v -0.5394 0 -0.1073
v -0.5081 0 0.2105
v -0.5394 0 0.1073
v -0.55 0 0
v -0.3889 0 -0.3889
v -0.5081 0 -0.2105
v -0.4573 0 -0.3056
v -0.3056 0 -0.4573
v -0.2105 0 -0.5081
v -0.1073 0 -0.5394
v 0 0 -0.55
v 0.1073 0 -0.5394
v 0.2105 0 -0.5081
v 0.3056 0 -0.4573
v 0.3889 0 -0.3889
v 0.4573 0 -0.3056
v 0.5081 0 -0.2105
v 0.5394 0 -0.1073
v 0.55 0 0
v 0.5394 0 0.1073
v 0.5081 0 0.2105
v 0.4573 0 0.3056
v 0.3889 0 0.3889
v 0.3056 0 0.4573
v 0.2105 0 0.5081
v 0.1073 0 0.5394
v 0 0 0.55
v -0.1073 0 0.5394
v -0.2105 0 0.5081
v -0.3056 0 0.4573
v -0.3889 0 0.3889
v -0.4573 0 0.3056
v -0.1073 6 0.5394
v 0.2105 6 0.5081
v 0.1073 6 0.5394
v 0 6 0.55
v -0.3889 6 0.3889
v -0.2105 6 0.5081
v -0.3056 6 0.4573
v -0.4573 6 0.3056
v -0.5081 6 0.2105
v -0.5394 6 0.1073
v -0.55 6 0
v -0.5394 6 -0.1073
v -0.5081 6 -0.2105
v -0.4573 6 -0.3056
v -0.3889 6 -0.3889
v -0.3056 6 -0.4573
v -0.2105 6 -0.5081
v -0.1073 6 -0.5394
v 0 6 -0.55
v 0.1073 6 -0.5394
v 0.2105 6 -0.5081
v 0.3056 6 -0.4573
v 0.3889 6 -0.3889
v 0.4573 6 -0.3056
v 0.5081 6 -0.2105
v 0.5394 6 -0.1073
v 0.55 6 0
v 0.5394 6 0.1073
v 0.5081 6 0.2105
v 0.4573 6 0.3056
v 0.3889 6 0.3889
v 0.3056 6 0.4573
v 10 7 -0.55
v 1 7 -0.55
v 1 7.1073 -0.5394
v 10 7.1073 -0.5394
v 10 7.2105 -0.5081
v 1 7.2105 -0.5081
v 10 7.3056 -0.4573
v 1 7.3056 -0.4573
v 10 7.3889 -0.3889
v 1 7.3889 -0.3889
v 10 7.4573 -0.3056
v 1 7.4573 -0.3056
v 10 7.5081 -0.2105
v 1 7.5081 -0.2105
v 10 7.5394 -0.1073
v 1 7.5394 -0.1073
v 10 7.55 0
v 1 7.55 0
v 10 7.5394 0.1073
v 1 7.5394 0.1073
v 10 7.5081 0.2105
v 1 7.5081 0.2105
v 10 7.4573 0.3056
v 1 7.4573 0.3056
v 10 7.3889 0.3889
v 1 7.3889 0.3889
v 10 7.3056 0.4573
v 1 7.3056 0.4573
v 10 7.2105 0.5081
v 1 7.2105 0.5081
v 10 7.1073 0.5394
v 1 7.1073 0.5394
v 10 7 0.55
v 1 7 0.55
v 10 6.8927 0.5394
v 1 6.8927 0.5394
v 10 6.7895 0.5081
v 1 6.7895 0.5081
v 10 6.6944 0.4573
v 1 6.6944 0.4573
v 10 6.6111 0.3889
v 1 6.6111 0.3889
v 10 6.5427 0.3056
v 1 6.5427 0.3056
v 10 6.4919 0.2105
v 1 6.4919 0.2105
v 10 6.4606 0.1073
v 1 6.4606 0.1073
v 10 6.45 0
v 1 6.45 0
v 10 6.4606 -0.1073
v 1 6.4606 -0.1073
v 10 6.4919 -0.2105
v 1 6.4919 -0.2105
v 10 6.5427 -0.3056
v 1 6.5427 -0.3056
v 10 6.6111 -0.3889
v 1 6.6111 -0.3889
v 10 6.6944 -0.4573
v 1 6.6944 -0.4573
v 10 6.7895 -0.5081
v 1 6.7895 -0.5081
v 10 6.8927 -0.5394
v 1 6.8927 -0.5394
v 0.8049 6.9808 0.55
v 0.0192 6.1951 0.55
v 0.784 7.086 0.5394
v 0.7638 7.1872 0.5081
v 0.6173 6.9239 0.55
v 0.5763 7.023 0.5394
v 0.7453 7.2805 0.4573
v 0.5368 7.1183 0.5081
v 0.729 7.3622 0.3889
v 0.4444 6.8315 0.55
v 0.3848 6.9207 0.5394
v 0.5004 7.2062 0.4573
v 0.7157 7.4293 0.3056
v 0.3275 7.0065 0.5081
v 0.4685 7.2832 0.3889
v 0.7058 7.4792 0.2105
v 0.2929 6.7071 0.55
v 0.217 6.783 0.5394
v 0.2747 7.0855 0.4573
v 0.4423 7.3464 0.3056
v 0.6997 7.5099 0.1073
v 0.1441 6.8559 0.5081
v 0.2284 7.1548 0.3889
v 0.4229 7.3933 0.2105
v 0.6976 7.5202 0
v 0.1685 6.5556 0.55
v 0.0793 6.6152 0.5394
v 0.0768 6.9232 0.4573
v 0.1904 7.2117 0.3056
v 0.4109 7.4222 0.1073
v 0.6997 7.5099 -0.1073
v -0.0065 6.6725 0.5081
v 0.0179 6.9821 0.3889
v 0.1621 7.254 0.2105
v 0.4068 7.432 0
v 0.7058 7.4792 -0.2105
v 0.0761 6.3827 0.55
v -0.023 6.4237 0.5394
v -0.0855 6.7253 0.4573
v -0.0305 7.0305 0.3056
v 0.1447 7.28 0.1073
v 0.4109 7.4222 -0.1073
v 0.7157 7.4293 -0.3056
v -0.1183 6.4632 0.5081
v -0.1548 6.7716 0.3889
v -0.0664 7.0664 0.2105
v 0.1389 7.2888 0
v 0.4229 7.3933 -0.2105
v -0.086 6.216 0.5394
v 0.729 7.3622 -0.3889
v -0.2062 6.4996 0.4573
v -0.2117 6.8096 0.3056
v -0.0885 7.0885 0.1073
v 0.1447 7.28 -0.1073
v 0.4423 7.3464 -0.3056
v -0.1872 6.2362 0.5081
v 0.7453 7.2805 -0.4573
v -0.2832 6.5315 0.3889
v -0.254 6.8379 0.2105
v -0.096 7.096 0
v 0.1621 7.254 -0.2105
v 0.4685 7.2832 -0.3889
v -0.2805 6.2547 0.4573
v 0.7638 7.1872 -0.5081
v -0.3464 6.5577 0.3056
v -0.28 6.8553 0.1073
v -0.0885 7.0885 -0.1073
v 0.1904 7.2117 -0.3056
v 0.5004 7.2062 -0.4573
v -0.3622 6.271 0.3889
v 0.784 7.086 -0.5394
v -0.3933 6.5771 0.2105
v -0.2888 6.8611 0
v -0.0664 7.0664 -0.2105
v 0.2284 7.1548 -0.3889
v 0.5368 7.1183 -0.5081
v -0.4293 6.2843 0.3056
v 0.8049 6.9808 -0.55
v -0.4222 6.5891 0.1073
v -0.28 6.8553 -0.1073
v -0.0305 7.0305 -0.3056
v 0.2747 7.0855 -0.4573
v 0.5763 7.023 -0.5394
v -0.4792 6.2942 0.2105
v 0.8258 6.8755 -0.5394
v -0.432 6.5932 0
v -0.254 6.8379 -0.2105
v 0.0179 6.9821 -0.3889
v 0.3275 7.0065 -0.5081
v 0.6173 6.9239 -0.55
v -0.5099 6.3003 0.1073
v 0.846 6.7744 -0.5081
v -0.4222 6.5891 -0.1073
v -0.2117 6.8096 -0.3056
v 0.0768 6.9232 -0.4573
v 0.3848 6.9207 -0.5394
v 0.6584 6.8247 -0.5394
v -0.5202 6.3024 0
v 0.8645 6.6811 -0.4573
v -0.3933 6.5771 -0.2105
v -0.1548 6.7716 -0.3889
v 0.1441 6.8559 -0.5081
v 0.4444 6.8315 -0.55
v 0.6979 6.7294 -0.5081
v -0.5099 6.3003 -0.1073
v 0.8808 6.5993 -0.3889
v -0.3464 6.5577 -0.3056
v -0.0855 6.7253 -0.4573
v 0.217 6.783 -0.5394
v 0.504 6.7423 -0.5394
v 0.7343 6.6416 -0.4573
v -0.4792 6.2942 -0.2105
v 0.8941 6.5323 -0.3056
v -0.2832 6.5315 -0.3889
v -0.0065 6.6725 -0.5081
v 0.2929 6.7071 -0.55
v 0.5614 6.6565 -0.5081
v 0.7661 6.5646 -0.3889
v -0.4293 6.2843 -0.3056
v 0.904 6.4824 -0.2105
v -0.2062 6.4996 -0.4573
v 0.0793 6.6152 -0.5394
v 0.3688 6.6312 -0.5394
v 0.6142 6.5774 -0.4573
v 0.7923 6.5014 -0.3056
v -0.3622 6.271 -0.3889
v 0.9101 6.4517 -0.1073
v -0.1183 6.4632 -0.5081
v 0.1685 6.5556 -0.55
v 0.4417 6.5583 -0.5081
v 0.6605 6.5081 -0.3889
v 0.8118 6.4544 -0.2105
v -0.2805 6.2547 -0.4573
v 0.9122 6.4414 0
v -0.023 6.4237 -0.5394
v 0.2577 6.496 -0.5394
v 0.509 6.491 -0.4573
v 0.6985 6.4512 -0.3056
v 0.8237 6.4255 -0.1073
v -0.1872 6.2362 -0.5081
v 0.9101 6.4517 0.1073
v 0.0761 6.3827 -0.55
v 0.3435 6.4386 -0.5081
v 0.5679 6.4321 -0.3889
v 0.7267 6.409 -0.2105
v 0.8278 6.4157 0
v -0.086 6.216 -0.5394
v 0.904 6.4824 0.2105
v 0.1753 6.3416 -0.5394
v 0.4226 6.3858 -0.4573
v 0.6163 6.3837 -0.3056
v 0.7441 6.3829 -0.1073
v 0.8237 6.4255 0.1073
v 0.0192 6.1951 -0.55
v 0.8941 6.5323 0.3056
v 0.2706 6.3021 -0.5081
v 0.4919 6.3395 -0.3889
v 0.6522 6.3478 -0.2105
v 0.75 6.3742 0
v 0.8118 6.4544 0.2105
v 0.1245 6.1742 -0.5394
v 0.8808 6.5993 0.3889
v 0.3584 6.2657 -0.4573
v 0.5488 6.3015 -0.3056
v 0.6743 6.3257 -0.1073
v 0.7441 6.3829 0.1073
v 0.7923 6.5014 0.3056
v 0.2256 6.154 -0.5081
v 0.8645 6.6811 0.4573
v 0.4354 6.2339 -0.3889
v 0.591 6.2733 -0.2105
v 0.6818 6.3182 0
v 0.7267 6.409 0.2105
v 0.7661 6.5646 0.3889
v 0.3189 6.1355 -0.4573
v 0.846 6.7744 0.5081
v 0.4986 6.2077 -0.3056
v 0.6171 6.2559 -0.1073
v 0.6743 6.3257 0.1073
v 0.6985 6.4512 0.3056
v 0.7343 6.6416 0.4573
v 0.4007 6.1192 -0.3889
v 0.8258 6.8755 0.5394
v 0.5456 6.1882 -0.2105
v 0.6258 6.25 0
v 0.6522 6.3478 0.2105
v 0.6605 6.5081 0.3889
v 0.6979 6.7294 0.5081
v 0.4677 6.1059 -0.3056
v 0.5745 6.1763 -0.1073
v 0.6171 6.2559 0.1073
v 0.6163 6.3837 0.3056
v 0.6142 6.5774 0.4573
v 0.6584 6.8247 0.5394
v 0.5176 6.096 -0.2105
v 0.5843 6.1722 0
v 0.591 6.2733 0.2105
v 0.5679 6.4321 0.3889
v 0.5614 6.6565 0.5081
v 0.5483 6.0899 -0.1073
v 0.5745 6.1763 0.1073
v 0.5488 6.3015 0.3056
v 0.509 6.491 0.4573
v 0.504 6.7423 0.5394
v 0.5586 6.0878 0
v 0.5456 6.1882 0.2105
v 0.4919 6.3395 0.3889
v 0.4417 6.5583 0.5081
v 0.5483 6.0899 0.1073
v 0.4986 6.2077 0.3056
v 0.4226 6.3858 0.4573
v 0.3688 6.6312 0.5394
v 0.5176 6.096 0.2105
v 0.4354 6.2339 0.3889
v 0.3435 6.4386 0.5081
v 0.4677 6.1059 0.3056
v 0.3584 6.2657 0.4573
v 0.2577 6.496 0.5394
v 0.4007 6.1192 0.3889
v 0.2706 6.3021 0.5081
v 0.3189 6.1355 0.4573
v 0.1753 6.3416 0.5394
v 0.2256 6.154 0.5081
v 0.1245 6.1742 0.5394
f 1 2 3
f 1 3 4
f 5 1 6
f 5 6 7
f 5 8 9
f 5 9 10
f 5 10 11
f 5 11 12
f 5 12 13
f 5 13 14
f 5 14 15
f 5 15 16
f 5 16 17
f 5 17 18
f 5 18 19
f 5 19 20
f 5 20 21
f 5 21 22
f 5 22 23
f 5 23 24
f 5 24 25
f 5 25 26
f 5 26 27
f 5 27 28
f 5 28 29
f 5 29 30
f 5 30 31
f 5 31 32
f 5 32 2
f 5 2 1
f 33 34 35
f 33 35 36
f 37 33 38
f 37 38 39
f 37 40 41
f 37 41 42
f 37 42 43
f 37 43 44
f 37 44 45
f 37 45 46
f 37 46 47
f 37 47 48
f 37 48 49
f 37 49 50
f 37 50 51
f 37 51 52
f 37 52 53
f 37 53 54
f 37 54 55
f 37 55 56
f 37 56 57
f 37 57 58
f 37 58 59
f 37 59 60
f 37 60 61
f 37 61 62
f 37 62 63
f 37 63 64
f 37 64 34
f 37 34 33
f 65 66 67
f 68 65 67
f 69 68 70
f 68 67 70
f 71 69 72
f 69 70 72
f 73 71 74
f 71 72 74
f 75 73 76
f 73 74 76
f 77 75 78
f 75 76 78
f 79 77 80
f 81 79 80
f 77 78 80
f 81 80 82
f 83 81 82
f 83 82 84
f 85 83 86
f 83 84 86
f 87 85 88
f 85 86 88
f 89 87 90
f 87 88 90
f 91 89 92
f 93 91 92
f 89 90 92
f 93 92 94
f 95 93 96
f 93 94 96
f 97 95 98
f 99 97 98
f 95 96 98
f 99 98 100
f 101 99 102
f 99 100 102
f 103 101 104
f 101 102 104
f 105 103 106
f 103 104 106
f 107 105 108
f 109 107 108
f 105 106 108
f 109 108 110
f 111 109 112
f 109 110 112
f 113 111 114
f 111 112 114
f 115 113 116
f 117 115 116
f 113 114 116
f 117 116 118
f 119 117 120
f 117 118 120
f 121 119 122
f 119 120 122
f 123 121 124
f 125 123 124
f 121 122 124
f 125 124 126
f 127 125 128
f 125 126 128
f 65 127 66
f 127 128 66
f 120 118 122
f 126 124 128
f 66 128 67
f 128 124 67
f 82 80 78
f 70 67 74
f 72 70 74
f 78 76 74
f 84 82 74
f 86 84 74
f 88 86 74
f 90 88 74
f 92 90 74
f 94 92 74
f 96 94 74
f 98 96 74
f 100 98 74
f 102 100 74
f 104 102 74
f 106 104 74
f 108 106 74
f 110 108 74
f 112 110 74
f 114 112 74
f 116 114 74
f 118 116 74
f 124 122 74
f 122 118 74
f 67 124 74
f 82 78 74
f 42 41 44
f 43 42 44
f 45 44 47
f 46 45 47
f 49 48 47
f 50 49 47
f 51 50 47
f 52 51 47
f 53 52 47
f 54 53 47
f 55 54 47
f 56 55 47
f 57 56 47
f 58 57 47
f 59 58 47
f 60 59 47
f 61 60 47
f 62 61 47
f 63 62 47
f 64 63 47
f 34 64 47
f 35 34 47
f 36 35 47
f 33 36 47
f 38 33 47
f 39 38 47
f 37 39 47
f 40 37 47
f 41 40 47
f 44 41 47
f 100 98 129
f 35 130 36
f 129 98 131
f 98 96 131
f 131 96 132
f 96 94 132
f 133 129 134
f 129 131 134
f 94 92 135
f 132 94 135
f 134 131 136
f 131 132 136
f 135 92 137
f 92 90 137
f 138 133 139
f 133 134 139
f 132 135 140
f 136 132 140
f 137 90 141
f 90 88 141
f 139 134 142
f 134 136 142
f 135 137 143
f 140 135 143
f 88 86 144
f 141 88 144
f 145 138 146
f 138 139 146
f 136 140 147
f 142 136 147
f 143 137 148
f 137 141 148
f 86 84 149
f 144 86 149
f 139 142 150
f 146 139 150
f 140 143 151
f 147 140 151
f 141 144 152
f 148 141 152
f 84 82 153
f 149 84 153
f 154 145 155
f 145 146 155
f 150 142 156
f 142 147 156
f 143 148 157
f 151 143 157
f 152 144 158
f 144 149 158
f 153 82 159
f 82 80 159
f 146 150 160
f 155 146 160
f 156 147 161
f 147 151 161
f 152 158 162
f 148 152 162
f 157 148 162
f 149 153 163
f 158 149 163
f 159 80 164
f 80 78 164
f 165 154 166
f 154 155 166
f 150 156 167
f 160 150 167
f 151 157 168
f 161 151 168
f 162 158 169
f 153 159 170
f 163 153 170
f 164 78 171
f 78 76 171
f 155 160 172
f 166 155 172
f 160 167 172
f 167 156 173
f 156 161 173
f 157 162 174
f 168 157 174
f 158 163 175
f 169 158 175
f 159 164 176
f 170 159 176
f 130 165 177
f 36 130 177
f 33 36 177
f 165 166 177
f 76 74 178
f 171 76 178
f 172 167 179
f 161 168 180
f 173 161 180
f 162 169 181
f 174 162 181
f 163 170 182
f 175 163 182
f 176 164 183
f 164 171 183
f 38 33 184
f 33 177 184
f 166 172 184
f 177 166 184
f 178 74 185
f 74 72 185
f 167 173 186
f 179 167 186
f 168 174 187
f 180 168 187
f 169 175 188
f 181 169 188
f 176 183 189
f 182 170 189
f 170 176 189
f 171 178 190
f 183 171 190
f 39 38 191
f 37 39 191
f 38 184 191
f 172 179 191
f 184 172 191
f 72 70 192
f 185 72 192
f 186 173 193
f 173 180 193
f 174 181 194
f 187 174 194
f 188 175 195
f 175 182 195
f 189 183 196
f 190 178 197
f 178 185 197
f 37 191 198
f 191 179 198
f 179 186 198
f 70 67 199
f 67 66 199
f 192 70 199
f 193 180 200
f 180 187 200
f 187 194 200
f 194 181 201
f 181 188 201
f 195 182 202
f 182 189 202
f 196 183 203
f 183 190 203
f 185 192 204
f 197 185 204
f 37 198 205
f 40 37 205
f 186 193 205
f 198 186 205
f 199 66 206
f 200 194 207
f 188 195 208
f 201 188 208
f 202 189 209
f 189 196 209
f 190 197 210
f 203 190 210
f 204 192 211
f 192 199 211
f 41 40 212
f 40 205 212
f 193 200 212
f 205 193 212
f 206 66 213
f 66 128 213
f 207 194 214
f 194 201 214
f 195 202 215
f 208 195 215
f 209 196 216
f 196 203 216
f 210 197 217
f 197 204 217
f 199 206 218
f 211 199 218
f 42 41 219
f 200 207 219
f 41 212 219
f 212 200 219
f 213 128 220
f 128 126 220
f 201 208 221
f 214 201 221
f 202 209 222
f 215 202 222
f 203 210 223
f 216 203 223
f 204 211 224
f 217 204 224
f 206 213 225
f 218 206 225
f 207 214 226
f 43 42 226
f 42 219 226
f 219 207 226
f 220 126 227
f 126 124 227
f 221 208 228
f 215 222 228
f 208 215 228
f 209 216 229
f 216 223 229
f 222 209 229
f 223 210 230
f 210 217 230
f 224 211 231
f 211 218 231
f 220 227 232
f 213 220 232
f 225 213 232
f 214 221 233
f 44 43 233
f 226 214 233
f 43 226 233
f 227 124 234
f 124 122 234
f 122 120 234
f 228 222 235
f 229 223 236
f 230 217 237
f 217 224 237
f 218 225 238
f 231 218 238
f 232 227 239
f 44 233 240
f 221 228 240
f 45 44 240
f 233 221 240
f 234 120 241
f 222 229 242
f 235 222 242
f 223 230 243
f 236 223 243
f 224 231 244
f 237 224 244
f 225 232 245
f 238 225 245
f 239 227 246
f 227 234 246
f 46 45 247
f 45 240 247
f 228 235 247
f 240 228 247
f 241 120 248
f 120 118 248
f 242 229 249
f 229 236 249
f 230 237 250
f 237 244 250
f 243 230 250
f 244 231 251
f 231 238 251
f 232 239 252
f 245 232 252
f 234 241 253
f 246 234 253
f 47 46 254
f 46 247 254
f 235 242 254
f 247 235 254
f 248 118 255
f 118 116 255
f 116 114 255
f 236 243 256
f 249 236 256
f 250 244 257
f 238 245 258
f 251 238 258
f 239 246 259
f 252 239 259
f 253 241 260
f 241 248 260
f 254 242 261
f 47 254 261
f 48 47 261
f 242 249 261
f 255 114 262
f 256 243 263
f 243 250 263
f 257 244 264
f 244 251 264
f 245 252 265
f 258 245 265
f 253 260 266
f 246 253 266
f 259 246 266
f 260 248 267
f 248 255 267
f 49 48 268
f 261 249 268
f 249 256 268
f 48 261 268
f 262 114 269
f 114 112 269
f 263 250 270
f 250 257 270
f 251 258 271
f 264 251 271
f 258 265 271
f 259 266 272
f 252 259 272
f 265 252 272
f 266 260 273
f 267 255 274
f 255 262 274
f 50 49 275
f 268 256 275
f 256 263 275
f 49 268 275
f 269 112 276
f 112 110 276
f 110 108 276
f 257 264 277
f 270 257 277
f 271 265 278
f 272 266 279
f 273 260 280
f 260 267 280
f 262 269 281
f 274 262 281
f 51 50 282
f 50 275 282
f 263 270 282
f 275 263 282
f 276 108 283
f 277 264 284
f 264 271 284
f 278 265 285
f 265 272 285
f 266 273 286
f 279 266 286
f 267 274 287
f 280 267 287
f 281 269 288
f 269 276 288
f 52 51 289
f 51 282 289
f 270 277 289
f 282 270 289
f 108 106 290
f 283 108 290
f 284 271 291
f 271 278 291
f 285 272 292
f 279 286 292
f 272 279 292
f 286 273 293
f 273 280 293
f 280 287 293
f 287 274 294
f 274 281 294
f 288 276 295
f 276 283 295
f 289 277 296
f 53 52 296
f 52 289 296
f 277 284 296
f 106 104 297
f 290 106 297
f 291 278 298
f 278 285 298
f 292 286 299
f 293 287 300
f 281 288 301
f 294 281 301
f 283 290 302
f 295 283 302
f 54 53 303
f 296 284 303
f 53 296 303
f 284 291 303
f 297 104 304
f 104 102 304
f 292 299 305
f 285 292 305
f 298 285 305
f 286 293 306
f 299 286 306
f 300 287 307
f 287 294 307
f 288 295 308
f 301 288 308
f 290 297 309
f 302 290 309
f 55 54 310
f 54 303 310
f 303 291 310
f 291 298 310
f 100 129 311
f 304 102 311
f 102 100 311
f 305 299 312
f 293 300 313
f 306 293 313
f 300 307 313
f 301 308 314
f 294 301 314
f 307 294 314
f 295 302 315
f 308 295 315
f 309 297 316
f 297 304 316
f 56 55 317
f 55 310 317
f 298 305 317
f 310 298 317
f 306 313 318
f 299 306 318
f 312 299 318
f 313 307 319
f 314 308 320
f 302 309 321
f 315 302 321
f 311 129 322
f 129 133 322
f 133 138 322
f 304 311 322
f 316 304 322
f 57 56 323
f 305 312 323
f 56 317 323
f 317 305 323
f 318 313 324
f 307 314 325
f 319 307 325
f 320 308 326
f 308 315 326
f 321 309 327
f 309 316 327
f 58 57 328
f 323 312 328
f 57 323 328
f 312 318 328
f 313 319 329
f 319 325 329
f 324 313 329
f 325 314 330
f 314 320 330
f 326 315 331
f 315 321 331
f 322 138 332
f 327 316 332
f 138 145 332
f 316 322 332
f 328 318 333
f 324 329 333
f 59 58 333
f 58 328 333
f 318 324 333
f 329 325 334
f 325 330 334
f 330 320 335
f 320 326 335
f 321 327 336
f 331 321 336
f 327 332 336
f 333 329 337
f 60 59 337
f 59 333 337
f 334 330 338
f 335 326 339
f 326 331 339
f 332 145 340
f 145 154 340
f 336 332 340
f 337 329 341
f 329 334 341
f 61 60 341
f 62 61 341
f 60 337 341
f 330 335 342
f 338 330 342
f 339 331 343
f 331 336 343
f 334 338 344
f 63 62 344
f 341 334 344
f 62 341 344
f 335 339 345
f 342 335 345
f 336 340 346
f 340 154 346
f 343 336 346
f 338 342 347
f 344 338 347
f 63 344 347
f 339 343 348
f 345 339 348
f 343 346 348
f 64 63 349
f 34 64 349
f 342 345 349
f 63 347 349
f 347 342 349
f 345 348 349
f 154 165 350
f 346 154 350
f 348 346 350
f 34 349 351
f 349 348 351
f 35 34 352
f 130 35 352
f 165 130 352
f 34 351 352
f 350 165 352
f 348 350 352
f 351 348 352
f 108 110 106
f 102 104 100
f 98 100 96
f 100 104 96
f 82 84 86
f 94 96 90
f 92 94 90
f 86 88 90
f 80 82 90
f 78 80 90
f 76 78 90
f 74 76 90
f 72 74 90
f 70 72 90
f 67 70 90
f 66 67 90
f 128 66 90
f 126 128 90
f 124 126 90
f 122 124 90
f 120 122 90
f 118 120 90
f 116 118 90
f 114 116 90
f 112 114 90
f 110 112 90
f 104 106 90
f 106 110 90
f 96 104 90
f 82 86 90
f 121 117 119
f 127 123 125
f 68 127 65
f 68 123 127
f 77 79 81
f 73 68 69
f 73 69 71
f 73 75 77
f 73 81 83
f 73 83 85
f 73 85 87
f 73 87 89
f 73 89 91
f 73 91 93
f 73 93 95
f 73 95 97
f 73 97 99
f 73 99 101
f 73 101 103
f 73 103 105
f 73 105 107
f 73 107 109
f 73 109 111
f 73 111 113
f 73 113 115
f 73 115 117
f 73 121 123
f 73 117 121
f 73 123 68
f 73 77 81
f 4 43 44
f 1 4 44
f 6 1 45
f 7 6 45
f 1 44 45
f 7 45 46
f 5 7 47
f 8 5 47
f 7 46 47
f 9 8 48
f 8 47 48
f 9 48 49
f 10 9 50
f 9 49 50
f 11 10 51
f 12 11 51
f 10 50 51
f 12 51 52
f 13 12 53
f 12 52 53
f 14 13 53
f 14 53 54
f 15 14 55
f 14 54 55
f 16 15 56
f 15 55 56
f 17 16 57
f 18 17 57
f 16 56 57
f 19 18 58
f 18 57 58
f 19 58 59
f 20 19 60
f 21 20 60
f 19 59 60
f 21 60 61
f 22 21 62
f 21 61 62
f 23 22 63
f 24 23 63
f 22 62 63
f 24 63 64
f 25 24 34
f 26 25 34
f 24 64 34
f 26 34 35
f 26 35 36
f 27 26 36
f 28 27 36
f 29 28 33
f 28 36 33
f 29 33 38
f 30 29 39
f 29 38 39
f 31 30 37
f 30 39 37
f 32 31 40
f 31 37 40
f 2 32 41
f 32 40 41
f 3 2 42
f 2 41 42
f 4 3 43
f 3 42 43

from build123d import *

# Parameters (mm, degrees)
SKETCH6_R           = 0.55
BOSS_EXTRUDE1_DEPTH = 6
SKETCH11_R          = 0.55
BOSS_EXTRUDE2_DEPTH = 9
SKETCH22_R          = 0.55
REVOLVE1_ANGLE      = 90


with BuildPart() as part:
    # Sketch6 → Boss-Extrude1 (new body)
    with BuildSketch(Plane(origin=(0, 6, 0), x_dir=(-1, 0, 0), z_dir=(0, -1, 0))):
        Circle(SKETCH6_R)
    extrude(amount=BOSS_EXTRUDE1_DEPTH)


with BuildPart() as body_2:
    # Sketch11 → Boss-Extrude2 (new body)
    with BuildSketch(Plane(origin=(1, 0, 0), x_dir=(0, 0, -1), z_dir=(1, 0, 0))):
        with Locations((0, 7)):
            Circle(SKETCH11_R)
    extrude(amount=BOSS_EXTRUDE2_DEPTH)


with BuildPart() as body_3:
    # Sketch22 → Revolve1 (revolve)
    with BuildSketch(Plane.ZY.offset(-1)):
        with Locations((0, 7)):
            Circle(SKETCH22_R)
    revolve(axis=Axis((1, 6, -0.280897507), (0, 0, 1)), revolution_arc=REVOLVE1_ANGLE)


solid = Compound([part.part, body_2.part, body_3.part])
